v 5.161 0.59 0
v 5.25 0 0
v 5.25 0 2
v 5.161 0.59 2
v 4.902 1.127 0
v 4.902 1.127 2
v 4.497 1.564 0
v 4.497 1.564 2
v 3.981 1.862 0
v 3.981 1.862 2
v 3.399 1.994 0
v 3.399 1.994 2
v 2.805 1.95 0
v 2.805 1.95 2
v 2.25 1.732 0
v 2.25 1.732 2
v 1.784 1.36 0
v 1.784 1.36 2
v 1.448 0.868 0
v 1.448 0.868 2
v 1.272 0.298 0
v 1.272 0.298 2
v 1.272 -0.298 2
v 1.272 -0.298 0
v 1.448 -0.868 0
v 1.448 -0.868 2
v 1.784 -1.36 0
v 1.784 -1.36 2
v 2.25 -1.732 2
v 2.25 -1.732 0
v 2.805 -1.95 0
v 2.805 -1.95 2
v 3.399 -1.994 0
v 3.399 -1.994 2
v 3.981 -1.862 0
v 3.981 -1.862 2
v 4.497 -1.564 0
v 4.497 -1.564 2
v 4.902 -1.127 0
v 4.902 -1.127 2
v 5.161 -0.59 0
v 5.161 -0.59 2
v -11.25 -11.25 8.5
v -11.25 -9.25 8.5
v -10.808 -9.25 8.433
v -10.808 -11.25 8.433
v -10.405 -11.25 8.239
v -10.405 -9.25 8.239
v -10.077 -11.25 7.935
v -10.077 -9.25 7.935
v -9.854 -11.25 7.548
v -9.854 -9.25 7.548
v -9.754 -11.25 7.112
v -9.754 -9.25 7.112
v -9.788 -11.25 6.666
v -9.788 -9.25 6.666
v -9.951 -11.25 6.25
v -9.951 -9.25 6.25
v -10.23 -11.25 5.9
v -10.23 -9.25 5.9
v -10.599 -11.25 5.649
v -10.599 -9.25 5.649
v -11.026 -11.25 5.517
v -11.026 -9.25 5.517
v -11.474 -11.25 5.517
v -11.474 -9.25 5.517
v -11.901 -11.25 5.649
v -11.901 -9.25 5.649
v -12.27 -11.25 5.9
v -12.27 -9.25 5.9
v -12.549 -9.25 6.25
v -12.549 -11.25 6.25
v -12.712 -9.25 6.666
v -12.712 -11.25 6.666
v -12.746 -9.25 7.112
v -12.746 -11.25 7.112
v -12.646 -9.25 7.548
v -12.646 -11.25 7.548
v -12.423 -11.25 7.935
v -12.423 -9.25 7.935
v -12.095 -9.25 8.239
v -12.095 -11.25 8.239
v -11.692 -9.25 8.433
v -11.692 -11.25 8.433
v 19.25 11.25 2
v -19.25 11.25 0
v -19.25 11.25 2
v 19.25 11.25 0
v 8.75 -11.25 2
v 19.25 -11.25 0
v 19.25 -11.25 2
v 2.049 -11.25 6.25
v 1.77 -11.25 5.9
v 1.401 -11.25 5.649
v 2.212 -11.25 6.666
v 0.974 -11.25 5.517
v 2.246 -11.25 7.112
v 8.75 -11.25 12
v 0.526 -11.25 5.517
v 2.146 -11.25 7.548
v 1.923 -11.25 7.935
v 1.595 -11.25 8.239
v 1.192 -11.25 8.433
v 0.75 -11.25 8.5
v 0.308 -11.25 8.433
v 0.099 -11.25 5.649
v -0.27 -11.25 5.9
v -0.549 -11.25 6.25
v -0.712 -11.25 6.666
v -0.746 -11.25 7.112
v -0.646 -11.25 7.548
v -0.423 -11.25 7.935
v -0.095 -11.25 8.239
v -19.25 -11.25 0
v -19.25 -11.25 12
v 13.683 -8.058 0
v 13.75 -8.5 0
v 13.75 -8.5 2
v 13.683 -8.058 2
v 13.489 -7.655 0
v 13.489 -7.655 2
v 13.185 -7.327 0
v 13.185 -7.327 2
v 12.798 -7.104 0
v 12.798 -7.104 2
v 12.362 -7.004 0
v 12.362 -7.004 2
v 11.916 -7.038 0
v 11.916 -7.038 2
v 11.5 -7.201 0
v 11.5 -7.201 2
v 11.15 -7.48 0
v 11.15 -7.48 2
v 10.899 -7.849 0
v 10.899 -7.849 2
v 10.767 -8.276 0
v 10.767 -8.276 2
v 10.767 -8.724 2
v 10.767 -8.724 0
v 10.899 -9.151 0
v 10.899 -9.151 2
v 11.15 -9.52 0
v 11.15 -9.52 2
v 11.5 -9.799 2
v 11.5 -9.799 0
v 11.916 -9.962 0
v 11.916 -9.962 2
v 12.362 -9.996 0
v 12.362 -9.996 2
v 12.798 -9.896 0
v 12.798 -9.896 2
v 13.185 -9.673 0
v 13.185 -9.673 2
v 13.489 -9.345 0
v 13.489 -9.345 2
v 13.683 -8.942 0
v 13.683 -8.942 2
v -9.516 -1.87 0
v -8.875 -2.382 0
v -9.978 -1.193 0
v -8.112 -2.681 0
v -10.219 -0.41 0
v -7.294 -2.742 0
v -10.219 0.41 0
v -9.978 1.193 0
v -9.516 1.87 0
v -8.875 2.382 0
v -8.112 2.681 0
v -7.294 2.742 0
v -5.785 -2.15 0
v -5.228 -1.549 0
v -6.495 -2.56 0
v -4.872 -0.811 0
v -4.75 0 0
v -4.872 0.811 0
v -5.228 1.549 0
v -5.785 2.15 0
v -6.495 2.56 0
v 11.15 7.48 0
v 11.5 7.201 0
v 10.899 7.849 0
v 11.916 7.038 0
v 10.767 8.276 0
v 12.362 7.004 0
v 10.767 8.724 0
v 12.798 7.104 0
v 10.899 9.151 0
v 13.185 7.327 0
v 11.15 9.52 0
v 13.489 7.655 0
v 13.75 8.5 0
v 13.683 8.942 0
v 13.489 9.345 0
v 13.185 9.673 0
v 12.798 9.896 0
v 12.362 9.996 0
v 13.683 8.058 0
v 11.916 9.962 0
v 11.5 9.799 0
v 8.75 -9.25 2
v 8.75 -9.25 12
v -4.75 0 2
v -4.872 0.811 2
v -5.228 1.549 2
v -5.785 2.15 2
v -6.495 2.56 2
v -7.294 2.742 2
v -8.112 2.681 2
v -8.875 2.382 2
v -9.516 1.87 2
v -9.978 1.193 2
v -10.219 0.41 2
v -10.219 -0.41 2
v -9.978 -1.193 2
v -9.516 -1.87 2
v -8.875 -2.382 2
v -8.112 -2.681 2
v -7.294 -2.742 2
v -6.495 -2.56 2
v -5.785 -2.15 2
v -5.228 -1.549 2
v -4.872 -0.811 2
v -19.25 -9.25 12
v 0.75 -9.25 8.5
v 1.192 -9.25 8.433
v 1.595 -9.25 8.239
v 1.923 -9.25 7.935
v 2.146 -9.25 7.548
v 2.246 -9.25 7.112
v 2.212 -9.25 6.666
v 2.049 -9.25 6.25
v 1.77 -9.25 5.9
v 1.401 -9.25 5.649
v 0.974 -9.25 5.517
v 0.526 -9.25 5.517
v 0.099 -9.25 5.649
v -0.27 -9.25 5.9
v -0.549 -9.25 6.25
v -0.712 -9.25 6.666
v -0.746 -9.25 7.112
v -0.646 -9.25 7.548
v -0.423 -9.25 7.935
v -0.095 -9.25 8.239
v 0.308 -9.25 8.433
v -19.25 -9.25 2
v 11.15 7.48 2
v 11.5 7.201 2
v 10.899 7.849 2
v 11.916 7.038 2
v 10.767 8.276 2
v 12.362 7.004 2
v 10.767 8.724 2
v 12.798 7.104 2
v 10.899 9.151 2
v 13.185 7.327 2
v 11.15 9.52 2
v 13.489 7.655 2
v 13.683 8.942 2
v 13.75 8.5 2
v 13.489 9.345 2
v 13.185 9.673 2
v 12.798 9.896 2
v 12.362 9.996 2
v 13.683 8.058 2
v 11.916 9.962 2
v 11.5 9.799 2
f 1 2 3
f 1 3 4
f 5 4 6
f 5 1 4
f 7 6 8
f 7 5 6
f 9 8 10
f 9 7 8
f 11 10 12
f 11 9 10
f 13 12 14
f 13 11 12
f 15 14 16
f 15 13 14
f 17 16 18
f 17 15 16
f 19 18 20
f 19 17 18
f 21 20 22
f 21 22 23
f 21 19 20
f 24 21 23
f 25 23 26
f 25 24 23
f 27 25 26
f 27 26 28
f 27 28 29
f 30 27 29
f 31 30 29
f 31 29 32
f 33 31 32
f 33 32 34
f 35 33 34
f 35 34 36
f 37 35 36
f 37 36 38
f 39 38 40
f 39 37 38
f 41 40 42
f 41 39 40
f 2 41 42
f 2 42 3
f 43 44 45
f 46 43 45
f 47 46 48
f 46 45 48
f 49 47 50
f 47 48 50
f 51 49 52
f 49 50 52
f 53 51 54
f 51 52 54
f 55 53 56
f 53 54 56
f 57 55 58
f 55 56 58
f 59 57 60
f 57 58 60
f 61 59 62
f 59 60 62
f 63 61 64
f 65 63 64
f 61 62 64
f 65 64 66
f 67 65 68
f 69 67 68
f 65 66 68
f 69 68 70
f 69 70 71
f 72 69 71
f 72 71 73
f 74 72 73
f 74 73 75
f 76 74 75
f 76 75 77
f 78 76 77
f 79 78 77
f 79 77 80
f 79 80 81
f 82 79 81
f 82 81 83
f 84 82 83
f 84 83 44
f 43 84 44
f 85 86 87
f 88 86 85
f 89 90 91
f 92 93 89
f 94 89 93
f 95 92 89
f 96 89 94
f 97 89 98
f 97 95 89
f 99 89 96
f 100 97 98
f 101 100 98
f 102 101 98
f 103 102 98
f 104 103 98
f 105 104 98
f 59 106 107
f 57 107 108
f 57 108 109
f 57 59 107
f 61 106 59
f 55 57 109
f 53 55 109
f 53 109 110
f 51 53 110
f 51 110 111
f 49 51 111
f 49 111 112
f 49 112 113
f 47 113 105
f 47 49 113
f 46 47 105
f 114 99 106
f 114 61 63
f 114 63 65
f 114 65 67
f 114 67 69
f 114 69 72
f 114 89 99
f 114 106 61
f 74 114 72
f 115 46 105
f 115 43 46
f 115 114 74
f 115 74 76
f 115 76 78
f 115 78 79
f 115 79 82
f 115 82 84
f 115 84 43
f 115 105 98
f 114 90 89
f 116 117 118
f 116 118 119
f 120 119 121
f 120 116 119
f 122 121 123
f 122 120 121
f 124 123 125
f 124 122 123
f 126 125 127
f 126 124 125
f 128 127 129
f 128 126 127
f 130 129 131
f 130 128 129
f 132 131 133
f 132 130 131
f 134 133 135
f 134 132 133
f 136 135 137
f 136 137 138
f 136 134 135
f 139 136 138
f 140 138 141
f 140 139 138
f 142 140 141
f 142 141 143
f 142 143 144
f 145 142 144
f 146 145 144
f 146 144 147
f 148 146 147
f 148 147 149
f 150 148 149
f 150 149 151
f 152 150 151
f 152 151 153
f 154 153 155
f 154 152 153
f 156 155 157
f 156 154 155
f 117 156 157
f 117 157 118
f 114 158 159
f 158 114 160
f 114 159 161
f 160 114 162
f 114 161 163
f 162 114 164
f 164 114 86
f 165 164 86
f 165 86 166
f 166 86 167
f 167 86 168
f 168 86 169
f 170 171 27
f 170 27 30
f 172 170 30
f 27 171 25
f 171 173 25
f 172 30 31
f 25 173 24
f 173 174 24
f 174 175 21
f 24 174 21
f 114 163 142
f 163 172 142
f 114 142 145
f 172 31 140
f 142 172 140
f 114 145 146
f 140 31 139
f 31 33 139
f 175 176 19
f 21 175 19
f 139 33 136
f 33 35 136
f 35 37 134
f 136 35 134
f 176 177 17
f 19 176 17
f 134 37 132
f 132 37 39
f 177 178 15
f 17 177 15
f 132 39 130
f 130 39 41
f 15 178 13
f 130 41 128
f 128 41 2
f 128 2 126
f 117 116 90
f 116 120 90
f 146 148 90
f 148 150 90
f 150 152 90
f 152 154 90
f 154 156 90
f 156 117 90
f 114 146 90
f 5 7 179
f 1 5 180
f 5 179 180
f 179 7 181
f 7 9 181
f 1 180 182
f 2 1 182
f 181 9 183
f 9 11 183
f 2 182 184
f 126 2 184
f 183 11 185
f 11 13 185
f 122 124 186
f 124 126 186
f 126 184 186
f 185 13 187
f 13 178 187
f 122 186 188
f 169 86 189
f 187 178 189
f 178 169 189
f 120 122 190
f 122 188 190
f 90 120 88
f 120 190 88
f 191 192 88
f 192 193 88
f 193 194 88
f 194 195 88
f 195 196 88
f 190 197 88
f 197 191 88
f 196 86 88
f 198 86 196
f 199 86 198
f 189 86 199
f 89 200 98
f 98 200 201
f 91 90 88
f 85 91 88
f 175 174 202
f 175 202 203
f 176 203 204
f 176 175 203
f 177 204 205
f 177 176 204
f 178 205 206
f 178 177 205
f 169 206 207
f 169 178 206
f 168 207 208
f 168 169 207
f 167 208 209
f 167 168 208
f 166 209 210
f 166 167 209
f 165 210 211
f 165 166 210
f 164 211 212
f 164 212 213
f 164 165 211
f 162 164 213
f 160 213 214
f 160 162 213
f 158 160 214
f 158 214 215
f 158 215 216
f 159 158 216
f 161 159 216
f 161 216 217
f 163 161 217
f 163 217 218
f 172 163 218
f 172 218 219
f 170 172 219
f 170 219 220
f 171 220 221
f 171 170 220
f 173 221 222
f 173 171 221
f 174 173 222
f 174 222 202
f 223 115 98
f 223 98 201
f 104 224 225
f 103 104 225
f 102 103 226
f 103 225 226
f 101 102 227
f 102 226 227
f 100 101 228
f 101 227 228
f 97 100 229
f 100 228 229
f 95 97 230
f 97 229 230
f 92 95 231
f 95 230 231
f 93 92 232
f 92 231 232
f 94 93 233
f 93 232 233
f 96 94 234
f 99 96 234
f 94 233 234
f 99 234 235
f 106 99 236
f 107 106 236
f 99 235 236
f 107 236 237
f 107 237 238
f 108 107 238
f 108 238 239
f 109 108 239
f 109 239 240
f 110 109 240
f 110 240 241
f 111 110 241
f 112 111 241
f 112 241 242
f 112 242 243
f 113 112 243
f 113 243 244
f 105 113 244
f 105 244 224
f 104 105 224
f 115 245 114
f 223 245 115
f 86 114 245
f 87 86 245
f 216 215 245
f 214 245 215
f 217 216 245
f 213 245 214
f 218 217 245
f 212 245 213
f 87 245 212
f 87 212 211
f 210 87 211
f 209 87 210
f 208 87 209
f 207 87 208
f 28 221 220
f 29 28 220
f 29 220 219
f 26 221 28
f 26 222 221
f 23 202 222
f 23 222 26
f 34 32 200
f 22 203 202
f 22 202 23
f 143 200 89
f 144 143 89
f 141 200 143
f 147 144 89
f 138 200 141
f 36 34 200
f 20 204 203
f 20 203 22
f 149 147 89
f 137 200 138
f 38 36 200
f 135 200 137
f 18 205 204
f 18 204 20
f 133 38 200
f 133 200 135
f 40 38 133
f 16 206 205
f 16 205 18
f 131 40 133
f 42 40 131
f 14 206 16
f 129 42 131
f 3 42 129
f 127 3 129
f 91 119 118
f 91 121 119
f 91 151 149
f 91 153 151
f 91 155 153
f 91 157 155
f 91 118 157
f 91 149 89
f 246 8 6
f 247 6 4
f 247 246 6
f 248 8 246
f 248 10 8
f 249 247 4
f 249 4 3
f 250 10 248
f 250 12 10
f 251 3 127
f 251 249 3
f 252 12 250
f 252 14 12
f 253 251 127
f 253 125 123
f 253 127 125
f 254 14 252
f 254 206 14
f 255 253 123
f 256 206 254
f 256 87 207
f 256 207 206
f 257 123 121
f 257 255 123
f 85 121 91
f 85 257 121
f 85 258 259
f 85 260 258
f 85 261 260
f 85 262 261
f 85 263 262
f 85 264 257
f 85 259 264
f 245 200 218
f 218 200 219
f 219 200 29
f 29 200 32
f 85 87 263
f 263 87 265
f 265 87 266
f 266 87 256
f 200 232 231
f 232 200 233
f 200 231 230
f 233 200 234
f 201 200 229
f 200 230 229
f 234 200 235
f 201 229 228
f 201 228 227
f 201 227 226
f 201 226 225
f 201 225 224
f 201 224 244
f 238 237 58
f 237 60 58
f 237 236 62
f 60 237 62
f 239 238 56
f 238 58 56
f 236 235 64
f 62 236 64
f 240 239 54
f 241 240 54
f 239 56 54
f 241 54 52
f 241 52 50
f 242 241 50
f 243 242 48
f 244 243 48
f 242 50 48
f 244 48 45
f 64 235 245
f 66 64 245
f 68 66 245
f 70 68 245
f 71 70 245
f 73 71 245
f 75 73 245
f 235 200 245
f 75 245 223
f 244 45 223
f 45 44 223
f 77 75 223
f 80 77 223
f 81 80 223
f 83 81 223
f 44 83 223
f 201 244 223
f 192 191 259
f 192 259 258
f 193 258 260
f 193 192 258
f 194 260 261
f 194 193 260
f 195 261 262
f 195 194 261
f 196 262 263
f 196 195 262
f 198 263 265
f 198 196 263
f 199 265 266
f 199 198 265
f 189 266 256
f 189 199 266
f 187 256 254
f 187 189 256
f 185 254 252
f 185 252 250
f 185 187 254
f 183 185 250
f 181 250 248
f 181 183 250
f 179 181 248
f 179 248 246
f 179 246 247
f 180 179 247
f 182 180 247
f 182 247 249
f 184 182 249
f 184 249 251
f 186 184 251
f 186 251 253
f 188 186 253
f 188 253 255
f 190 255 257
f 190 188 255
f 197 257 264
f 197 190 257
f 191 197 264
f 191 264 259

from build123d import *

# Parameters (mm, degrees)
SKETCH1_W           = 38.5
SKETCH1_H           = 22.5
SKETCH1_R           = 2.75
SKETCH1_R_2         = 2
SKETCH1_R_3         = 1.5
BOSS_EXTRUDE1_DEPTH = 2
SKETCH2_W           = 10
SKETCH2_H           = 2
BOSS_EXTRUDE2_DEPTH = 28
SKETCH4_R           = 1.5
CUT_EXTRUDE1_DEPTH  = 5


with BuildPart() as part:
    # Sketch1 → Boss-Extrude1 (new body)
    with BuildSketch(Plane.XY):
        Rectangle(SKETCH1_W, SKETCH1_H)
        with Locations((-7.5, 0)):
            Circle(SKETCH1_R, mode=Mode.SUBTRACT)
        with Locations((3.25, 0)):
            Circle(SKETCH1_R_2, mode=Mode.SUBTRACT)
        with Locations((12.25, -8.5)):
            Circle(SKETCH1_R_3, mode=Mode.SUBTRACT)
        with Locations((12.25, 8.5)):
            Circle(SKETCH1_R_3, mode=Mode.SUBTRACT)
    extrude(amount=BOSS_EXTRUDE1_DEPTH)

    # Sketch2 → Boss-Extrude2 (add)
    with BuildSketch(Plane.ZY.offset(19.25)):
        with Locations((7, -10.25)):
            Rectangle(SKETCH2_W, SKETCH2_H)
    extrude(amount=-BOSS_EXTRUDE2_DEPTH)

    # Sketch4 → Cut-Extrude1 (cut)
    with BuildSketch(Plane(origin=(0, -9.25, 0), x_dir=(1, 0, 0), z_dir=(0, 1, 0))):
        with Locations(Location((-11.25, -7, 0), (0, 0, 270))):  # turned: the seam where the file's is
            Circle(SKETCH4_R)
        with Locations(Location((0.75, -7, 0), (0, 0, 270))):  # turned: the seam where the file's is
            Circle(SKETCH4_R)
    extrude(amount=-CUT_EXTRUDE1_DEPTH, mode=Mode.SUBTRACT)


solid = part.part
